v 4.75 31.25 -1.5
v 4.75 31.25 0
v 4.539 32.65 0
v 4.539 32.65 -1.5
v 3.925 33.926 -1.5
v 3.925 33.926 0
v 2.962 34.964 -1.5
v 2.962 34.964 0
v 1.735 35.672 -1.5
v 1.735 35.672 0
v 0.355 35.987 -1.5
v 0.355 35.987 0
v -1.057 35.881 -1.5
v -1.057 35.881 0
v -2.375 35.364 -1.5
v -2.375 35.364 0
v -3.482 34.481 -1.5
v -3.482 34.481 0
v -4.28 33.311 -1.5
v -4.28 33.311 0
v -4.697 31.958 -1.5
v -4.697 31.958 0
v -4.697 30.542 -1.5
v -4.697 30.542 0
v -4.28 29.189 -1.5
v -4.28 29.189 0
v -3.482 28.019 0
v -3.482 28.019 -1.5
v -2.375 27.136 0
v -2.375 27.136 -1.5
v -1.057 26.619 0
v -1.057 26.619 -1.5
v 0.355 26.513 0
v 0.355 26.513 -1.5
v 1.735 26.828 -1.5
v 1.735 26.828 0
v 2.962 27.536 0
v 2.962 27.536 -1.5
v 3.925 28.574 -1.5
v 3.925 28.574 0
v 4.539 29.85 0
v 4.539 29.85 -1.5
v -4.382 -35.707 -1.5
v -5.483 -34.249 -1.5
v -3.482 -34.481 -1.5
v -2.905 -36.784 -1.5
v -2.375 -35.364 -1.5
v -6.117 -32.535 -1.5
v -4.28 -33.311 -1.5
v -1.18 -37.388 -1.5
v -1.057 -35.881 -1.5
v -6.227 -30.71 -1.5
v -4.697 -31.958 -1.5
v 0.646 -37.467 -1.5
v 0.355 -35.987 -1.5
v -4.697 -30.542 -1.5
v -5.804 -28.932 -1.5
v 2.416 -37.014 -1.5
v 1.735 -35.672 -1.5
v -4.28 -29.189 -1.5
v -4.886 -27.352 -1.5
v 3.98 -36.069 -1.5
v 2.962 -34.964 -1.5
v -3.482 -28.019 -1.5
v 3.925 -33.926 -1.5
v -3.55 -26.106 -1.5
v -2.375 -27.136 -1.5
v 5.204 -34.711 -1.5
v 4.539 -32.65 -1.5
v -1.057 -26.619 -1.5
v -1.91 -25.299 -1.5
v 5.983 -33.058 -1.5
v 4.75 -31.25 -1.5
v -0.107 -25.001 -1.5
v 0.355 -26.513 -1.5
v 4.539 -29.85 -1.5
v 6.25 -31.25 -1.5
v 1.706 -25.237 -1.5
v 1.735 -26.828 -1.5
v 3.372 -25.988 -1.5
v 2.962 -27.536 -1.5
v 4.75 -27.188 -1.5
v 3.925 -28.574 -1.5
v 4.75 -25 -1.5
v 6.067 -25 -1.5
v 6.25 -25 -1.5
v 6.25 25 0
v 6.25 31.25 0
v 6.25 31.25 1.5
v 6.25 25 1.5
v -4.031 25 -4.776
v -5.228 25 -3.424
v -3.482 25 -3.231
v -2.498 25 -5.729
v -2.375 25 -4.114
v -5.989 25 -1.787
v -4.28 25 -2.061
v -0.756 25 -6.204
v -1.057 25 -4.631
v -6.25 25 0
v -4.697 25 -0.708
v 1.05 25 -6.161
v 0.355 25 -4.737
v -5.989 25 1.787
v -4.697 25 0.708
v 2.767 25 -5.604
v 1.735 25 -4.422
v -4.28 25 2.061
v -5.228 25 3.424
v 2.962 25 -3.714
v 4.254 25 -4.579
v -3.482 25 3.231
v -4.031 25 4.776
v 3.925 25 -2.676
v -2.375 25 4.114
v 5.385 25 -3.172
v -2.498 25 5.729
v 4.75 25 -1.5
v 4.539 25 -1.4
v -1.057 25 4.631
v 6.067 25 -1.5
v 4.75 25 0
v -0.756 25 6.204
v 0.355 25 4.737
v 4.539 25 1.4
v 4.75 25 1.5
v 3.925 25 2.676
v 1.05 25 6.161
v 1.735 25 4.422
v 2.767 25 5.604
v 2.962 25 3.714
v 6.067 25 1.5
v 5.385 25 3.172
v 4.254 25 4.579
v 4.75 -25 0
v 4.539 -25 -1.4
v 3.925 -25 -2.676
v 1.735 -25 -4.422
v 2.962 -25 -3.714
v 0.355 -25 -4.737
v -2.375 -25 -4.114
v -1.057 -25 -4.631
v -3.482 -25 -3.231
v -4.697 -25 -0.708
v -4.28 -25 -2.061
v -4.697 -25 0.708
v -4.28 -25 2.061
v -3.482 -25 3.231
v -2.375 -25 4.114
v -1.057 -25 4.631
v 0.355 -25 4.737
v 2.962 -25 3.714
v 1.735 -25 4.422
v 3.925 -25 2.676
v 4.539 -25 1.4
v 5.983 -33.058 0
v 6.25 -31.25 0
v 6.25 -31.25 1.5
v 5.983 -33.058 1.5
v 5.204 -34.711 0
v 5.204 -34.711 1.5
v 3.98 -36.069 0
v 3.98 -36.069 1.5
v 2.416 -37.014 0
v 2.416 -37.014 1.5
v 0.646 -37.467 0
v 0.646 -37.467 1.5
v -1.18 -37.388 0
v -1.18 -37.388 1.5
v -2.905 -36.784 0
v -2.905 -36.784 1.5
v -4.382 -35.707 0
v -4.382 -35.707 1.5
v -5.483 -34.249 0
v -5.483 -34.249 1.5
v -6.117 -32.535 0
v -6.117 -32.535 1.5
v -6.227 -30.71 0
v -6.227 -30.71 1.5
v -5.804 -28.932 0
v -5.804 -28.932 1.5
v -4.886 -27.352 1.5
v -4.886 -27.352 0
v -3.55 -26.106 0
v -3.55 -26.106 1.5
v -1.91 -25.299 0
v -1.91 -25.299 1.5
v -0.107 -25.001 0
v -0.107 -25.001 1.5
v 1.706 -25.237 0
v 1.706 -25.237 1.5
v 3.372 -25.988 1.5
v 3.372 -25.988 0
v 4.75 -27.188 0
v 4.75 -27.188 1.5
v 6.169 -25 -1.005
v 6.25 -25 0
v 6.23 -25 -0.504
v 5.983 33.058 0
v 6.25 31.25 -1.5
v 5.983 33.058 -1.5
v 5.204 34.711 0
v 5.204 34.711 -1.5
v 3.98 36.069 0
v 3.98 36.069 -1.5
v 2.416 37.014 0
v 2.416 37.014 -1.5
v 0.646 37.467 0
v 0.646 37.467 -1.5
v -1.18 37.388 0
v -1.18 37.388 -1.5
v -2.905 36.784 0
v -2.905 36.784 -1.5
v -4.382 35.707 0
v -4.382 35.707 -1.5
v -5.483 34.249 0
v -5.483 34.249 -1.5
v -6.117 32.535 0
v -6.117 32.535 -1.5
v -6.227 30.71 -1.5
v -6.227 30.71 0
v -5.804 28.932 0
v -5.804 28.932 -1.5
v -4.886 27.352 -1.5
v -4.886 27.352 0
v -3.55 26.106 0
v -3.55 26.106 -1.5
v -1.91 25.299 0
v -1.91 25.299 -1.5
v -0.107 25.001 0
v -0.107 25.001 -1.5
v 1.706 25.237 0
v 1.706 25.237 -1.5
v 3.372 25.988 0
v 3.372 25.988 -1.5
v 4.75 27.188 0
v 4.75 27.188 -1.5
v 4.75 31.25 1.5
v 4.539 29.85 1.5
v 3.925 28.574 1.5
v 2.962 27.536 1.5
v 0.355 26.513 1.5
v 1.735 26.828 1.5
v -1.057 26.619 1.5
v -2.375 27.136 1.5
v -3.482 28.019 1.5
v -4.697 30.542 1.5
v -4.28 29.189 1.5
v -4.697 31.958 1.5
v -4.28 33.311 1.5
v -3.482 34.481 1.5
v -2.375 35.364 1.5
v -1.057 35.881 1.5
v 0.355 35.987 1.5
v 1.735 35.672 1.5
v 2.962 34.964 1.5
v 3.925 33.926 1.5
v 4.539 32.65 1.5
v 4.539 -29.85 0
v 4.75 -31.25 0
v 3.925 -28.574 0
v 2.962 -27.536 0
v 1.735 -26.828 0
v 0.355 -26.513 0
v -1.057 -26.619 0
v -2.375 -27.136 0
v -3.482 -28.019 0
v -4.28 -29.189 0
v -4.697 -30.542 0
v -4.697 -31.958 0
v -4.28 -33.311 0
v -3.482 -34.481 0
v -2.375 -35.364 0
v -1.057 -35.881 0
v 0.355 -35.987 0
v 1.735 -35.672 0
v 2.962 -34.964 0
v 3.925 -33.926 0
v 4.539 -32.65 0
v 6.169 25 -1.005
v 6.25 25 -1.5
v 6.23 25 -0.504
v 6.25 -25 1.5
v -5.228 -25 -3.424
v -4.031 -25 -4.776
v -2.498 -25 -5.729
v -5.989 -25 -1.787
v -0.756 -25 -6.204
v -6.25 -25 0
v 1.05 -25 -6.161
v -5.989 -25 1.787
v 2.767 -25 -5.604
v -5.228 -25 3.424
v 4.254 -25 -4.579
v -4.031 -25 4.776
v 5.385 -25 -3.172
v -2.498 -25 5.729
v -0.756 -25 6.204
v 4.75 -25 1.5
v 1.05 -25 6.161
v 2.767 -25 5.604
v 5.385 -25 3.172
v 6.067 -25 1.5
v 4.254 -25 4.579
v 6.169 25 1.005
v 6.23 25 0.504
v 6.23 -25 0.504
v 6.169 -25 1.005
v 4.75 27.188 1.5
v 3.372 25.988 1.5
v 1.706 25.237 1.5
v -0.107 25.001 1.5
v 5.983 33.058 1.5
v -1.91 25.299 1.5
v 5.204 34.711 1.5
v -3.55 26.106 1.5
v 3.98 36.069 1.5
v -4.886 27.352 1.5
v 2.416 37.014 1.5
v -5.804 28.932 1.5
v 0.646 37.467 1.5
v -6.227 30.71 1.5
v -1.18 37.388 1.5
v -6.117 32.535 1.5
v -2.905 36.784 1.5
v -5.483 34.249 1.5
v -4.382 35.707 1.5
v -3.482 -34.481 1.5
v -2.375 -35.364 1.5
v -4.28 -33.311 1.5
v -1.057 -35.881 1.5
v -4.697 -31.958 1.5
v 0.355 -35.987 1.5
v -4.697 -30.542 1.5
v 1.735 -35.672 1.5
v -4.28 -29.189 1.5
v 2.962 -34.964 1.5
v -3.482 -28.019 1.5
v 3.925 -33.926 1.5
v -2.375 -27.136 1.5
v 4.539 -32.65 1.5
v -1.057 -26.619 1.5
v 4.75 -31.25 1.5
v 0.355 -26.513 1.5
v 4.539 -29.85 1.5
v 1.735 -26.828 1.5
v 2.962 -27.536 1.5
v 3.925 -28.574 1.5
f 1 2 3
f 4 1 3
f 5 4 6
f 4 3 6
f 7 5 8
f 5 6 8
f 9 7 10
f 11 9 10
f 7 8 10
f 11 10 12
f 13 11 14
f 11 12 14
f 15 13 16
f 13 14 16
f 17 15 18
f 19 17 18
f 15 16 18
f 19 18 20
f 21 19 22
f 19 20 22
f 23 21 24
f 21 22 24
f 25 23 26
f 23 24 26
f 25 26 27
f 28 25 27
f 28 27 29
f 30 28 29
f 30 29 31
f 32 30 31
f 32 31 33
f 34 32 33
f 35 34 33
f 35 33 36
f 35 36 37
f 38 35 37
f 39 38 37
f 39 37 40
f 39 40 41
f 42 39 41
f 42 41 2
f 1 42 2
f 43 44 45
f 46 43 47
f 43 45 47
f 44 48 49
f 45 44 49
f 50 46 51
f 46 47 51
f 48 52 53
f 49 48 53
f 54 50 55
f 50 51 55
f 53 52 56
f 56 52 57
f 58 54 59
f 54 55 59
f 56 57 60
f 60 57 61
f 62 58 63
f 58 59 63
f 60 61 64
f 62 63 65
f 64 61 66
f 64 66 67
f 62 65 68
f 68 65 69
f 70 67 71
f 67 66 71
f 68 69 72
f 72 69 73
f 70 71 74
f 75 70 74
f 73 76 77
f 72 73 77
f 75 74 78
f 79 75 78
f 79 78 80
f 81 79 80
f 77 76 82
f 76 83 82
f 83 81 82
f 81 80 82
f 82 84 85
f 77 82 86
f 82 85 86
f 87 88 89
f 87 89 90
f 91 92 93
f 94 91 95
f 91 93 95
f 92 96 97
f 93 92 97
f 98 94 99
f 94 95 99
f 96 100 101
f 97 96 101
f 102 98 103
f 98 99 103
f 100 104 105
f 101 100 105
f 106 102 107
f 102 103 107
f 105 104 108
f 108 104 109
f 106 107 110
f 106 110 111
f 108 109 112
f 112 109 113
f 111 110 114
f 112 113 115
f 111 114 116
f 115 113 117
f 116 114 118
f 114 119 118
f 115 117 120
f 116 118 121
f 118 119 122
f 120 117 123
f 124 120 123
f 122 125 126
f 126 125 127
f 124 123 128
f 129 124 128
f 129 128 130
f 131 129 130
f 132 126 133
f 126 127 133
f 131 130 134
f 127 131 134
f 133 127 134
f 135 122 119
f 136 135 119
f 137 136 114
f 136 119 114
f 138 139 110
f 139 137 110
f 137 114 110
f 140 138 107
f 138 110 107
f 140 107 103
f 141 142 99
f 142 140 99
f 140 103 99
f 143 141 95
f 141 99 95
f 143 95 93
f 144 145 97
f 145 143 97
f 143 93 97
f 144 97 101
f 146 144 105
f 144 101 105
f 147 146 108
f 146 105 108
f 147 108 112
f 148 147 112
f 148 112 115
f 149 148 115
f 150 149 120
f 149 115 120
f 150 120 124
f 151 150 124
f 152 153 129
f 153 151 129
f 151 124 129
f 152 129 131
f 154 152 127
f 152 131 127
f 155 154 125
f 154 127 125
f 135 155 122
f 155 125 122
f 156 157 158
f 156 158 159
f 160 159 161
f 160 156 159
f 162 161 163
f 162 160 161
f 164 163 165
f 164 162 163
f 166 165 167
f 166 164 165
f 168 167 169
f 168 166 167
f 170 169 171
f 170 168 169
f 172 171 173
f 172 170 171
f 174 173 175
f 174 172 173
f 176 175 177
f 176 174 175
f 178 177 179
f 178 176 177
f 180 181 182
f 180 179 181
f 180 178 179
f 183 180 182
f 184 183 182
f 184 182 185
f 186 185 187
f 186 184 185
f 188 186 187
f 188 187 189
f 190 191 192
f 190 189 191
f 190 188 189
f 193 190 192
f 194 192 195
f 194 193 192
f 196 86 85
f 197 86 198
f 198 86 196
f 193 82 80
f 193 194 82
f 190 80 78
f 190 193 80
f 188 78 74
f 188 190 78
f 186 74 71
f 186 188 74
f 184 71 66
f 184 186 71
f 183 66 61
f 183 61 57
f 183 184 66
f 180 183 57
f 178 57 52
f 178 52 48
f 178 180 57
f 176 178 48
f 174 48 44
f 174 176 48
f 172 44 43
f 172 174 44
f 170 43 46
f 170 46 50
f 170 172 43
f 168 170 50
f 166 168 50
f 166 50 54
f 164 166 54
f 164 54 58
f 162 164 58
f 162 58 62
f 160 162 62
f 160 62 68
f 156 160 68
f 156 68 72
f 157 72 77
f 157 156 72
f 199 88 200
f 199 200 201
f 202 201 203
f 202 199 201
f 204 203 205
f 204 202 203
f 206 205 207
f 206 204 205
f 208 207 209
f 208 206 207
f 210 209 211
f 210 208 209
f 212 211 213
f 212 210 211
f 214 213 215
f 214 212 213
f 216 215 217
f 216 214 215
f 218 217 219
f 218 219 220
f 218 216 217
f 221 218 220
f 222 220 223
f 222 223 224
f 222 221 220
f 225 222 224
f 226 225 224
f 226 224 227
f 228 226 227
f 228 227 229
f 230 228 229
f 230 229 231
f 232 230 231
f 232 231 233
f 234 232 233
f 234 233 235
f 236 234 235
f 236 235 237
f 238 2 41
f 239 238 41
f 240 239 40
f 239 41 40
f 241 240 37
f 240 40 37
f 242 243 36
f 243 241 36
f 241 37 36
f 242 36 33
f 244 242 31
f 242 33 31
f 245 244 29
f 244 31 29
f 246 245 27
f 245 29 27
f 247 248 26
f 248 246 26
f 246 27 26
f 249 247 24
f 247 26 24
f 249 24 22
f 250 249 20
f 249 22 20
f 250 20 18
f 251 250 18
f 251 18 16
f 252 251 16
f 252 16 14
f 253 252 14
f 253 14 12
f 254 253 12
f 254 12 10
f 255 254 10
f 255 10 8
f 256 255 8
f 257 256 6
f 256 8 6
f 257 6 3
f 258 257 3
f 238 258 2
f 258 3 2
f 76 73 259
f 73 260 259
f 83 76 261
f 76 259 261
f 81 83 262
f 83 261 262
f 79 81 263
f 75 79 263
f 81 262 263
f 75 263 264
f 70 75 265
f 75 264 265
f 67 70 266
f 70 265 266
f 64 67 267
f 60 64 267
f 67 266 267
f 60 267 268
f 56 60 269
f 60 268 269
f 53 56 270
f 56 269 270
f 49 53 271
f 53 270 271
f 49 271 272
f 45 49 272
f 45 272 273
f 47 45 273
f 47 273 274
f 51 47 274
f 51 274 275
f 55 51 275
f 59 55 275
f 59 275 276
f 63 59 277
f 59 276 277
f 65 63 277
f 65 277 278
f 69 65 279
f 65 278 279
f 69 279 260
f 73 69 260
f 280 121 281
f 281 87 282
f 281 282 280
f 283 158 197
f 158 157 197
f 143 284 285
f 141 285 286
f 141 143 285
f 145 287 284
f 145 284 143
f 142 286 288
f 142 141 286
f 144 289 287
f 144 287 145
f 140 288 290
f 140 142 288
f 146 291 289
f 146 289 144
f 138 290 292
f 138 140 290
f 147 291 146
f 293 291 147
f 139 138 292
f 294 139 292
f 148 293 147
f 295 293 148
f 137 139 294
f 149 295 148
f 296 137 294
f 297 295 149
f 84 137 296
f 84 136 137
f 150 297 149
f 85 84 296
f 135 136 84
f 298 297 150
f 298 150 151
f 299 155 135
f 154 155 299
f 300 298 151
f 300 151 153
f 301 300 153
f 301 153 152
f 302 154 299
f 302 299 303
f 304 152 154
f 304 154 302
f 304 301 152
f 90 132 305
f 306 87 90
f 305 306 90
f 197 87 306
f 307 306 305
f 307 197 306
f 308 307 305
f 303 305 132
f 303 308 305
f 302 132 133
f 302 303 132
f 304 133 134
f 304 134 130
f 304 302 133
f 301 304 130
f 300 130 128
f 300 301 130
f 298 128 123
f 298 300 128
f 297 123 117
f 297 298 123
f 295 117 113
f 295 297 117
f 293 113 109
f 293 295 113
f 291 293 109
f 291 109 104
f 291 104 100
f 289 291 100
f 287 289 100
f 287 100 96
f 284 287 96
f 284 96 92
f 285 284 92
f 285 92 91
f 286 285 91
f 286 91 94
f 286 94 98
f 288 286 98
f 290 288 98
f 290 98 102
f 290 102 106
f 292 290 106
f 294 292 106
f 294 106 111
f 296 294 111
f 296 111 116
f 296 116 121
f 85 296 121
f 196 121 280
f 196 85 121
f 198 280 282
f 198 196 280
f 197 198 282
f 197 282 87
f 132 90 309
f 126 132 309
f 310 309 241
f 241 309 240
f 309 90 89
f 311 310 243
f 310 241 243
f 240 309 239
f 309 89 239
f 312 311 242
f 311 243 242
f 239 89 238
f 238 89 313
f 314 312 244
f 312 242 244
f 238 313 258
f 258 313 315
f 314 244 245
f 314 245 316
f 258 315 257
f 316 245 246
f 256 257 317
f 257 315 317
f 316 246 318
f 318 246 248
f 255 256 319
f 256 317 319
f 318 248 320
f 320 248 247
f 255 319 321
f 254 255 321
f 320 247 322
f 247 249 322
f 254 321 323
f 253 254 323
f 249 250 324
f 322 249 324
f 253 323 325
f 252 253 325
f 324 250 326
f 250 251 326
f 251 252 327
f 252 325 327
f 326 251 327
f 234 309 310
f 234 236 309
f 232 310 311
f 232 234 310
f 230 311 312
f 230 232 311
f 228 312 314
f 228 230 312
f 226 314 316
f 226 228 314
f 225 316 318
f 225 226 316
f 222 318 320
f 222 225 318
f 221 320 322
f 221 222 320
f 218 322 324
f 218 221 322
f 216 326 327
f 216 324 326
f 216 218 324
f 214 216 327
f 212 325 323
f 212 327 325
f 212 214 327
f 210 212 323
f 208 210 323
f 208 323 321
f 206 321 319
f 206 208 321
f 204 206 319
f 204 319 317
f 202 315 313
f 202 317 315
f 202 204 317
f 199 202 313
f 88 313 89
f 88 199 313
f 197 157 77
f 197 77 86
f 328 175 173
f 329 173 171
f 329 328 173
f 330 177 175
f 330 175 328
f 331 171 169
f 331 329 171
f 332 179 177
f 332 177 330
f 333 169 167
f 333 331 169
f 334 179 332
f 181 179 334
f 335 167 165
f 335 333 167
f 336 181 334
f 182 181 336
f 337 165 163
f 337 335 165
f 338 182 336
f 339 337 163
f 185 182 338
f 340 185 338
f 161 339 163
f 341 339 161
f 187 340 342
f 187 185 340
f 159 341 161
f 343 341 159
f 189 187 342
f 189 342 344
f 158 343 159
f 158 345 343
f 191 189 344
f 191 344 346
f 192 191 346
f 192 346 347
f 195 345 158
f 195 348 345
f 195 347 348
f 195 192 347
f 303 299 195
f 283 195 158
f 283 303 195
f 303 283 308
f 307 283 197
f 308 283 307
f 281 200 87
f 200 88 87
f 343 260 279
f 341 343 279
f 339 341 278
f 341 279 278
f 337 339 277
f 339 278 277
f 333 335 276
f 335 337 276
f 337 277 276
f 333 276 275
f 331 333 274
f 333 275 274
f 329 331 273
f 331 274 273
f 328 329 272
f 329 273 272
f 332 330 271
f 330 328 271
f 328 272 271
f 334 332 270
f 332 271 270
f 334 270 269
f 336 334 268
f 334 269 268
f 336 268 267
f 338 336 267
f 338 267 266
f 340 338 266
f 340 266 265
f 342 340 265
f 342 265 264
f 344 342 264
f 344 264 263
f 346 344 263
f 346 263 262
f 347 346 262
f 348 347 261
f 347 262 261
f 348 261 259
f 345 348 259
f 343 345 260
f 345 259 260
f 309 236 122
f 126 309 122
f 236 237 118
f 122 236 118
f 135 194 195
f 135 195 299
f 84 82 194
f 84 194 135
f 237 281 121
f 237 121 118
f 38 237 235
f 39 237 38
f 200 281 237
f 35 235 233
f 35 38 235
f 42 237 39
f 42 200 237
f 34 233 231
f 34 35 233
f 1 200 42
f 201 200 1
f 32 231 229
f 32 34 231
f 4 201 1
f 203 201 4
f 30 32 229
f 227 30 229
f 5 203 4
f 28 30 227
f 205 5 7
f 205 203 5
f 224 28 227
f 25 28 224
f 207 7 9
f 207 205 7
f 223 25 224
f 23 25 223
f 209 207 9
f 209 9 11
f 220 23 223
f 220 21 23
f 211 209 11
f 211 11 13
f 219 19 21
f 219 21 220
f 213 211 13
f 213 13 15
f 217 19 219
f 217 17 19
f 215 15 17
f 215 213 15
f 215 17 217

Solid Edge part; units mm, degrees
sketch "Sketch1" plane through (0, 0, 0) normal (0, 0, 1) x (1, 0, 0)
  line L0 (4.75, -25) -> (4.75, 25)
  line L1 (4.75, 25) -> (6.25, 25)
  line L2 (6.25, 25) -> (6.25, -25)
  line L3 (6.25, -25) -> (4.75, -25)
revolve "RevolvedProtrusion1" add sketch "Sketch1" angle 360 about axis through (0, 23.3565, 0) along (0, -1, 0)
sketch "Sketch2" plane through (0, 0, 0) normal (0, 0, 1) x (1, 0, 0)
  line L0 (6.25, 31.25) -> (6.25, 25)
  line L1 (4.75, 25) -> (6.25, 25)
  line L2 (4.75, 31.25) -> (4.75, 25)
  line L3 (4.75, 31.25) -> (6.25, 31.25)
  line L4 (6.25, -31.25) -> (6.25, -25)
  line L5 (6.25, -25) -> (4.75, -25)
  line L6 (4.75, -31.25) -> (4.75, -25)
  line L7 (4.75, -31.25) -> (6.25, -31.25)
  circle A0 centre (0, -31.25) radius 6.25
  circle A1 centre (0, -31.25) radius 4.75
  circle A2 centre (0, 31.25) radius 4.75
  circle A3 centre (0, 31.25) radius 6.25
  dimension "D1" = 6.25
  dimension "D2" = 1.5
  dimension "D3" = 75
extrude "Protrusion1" add sketch "Sketch2" along normal mid plane 3
